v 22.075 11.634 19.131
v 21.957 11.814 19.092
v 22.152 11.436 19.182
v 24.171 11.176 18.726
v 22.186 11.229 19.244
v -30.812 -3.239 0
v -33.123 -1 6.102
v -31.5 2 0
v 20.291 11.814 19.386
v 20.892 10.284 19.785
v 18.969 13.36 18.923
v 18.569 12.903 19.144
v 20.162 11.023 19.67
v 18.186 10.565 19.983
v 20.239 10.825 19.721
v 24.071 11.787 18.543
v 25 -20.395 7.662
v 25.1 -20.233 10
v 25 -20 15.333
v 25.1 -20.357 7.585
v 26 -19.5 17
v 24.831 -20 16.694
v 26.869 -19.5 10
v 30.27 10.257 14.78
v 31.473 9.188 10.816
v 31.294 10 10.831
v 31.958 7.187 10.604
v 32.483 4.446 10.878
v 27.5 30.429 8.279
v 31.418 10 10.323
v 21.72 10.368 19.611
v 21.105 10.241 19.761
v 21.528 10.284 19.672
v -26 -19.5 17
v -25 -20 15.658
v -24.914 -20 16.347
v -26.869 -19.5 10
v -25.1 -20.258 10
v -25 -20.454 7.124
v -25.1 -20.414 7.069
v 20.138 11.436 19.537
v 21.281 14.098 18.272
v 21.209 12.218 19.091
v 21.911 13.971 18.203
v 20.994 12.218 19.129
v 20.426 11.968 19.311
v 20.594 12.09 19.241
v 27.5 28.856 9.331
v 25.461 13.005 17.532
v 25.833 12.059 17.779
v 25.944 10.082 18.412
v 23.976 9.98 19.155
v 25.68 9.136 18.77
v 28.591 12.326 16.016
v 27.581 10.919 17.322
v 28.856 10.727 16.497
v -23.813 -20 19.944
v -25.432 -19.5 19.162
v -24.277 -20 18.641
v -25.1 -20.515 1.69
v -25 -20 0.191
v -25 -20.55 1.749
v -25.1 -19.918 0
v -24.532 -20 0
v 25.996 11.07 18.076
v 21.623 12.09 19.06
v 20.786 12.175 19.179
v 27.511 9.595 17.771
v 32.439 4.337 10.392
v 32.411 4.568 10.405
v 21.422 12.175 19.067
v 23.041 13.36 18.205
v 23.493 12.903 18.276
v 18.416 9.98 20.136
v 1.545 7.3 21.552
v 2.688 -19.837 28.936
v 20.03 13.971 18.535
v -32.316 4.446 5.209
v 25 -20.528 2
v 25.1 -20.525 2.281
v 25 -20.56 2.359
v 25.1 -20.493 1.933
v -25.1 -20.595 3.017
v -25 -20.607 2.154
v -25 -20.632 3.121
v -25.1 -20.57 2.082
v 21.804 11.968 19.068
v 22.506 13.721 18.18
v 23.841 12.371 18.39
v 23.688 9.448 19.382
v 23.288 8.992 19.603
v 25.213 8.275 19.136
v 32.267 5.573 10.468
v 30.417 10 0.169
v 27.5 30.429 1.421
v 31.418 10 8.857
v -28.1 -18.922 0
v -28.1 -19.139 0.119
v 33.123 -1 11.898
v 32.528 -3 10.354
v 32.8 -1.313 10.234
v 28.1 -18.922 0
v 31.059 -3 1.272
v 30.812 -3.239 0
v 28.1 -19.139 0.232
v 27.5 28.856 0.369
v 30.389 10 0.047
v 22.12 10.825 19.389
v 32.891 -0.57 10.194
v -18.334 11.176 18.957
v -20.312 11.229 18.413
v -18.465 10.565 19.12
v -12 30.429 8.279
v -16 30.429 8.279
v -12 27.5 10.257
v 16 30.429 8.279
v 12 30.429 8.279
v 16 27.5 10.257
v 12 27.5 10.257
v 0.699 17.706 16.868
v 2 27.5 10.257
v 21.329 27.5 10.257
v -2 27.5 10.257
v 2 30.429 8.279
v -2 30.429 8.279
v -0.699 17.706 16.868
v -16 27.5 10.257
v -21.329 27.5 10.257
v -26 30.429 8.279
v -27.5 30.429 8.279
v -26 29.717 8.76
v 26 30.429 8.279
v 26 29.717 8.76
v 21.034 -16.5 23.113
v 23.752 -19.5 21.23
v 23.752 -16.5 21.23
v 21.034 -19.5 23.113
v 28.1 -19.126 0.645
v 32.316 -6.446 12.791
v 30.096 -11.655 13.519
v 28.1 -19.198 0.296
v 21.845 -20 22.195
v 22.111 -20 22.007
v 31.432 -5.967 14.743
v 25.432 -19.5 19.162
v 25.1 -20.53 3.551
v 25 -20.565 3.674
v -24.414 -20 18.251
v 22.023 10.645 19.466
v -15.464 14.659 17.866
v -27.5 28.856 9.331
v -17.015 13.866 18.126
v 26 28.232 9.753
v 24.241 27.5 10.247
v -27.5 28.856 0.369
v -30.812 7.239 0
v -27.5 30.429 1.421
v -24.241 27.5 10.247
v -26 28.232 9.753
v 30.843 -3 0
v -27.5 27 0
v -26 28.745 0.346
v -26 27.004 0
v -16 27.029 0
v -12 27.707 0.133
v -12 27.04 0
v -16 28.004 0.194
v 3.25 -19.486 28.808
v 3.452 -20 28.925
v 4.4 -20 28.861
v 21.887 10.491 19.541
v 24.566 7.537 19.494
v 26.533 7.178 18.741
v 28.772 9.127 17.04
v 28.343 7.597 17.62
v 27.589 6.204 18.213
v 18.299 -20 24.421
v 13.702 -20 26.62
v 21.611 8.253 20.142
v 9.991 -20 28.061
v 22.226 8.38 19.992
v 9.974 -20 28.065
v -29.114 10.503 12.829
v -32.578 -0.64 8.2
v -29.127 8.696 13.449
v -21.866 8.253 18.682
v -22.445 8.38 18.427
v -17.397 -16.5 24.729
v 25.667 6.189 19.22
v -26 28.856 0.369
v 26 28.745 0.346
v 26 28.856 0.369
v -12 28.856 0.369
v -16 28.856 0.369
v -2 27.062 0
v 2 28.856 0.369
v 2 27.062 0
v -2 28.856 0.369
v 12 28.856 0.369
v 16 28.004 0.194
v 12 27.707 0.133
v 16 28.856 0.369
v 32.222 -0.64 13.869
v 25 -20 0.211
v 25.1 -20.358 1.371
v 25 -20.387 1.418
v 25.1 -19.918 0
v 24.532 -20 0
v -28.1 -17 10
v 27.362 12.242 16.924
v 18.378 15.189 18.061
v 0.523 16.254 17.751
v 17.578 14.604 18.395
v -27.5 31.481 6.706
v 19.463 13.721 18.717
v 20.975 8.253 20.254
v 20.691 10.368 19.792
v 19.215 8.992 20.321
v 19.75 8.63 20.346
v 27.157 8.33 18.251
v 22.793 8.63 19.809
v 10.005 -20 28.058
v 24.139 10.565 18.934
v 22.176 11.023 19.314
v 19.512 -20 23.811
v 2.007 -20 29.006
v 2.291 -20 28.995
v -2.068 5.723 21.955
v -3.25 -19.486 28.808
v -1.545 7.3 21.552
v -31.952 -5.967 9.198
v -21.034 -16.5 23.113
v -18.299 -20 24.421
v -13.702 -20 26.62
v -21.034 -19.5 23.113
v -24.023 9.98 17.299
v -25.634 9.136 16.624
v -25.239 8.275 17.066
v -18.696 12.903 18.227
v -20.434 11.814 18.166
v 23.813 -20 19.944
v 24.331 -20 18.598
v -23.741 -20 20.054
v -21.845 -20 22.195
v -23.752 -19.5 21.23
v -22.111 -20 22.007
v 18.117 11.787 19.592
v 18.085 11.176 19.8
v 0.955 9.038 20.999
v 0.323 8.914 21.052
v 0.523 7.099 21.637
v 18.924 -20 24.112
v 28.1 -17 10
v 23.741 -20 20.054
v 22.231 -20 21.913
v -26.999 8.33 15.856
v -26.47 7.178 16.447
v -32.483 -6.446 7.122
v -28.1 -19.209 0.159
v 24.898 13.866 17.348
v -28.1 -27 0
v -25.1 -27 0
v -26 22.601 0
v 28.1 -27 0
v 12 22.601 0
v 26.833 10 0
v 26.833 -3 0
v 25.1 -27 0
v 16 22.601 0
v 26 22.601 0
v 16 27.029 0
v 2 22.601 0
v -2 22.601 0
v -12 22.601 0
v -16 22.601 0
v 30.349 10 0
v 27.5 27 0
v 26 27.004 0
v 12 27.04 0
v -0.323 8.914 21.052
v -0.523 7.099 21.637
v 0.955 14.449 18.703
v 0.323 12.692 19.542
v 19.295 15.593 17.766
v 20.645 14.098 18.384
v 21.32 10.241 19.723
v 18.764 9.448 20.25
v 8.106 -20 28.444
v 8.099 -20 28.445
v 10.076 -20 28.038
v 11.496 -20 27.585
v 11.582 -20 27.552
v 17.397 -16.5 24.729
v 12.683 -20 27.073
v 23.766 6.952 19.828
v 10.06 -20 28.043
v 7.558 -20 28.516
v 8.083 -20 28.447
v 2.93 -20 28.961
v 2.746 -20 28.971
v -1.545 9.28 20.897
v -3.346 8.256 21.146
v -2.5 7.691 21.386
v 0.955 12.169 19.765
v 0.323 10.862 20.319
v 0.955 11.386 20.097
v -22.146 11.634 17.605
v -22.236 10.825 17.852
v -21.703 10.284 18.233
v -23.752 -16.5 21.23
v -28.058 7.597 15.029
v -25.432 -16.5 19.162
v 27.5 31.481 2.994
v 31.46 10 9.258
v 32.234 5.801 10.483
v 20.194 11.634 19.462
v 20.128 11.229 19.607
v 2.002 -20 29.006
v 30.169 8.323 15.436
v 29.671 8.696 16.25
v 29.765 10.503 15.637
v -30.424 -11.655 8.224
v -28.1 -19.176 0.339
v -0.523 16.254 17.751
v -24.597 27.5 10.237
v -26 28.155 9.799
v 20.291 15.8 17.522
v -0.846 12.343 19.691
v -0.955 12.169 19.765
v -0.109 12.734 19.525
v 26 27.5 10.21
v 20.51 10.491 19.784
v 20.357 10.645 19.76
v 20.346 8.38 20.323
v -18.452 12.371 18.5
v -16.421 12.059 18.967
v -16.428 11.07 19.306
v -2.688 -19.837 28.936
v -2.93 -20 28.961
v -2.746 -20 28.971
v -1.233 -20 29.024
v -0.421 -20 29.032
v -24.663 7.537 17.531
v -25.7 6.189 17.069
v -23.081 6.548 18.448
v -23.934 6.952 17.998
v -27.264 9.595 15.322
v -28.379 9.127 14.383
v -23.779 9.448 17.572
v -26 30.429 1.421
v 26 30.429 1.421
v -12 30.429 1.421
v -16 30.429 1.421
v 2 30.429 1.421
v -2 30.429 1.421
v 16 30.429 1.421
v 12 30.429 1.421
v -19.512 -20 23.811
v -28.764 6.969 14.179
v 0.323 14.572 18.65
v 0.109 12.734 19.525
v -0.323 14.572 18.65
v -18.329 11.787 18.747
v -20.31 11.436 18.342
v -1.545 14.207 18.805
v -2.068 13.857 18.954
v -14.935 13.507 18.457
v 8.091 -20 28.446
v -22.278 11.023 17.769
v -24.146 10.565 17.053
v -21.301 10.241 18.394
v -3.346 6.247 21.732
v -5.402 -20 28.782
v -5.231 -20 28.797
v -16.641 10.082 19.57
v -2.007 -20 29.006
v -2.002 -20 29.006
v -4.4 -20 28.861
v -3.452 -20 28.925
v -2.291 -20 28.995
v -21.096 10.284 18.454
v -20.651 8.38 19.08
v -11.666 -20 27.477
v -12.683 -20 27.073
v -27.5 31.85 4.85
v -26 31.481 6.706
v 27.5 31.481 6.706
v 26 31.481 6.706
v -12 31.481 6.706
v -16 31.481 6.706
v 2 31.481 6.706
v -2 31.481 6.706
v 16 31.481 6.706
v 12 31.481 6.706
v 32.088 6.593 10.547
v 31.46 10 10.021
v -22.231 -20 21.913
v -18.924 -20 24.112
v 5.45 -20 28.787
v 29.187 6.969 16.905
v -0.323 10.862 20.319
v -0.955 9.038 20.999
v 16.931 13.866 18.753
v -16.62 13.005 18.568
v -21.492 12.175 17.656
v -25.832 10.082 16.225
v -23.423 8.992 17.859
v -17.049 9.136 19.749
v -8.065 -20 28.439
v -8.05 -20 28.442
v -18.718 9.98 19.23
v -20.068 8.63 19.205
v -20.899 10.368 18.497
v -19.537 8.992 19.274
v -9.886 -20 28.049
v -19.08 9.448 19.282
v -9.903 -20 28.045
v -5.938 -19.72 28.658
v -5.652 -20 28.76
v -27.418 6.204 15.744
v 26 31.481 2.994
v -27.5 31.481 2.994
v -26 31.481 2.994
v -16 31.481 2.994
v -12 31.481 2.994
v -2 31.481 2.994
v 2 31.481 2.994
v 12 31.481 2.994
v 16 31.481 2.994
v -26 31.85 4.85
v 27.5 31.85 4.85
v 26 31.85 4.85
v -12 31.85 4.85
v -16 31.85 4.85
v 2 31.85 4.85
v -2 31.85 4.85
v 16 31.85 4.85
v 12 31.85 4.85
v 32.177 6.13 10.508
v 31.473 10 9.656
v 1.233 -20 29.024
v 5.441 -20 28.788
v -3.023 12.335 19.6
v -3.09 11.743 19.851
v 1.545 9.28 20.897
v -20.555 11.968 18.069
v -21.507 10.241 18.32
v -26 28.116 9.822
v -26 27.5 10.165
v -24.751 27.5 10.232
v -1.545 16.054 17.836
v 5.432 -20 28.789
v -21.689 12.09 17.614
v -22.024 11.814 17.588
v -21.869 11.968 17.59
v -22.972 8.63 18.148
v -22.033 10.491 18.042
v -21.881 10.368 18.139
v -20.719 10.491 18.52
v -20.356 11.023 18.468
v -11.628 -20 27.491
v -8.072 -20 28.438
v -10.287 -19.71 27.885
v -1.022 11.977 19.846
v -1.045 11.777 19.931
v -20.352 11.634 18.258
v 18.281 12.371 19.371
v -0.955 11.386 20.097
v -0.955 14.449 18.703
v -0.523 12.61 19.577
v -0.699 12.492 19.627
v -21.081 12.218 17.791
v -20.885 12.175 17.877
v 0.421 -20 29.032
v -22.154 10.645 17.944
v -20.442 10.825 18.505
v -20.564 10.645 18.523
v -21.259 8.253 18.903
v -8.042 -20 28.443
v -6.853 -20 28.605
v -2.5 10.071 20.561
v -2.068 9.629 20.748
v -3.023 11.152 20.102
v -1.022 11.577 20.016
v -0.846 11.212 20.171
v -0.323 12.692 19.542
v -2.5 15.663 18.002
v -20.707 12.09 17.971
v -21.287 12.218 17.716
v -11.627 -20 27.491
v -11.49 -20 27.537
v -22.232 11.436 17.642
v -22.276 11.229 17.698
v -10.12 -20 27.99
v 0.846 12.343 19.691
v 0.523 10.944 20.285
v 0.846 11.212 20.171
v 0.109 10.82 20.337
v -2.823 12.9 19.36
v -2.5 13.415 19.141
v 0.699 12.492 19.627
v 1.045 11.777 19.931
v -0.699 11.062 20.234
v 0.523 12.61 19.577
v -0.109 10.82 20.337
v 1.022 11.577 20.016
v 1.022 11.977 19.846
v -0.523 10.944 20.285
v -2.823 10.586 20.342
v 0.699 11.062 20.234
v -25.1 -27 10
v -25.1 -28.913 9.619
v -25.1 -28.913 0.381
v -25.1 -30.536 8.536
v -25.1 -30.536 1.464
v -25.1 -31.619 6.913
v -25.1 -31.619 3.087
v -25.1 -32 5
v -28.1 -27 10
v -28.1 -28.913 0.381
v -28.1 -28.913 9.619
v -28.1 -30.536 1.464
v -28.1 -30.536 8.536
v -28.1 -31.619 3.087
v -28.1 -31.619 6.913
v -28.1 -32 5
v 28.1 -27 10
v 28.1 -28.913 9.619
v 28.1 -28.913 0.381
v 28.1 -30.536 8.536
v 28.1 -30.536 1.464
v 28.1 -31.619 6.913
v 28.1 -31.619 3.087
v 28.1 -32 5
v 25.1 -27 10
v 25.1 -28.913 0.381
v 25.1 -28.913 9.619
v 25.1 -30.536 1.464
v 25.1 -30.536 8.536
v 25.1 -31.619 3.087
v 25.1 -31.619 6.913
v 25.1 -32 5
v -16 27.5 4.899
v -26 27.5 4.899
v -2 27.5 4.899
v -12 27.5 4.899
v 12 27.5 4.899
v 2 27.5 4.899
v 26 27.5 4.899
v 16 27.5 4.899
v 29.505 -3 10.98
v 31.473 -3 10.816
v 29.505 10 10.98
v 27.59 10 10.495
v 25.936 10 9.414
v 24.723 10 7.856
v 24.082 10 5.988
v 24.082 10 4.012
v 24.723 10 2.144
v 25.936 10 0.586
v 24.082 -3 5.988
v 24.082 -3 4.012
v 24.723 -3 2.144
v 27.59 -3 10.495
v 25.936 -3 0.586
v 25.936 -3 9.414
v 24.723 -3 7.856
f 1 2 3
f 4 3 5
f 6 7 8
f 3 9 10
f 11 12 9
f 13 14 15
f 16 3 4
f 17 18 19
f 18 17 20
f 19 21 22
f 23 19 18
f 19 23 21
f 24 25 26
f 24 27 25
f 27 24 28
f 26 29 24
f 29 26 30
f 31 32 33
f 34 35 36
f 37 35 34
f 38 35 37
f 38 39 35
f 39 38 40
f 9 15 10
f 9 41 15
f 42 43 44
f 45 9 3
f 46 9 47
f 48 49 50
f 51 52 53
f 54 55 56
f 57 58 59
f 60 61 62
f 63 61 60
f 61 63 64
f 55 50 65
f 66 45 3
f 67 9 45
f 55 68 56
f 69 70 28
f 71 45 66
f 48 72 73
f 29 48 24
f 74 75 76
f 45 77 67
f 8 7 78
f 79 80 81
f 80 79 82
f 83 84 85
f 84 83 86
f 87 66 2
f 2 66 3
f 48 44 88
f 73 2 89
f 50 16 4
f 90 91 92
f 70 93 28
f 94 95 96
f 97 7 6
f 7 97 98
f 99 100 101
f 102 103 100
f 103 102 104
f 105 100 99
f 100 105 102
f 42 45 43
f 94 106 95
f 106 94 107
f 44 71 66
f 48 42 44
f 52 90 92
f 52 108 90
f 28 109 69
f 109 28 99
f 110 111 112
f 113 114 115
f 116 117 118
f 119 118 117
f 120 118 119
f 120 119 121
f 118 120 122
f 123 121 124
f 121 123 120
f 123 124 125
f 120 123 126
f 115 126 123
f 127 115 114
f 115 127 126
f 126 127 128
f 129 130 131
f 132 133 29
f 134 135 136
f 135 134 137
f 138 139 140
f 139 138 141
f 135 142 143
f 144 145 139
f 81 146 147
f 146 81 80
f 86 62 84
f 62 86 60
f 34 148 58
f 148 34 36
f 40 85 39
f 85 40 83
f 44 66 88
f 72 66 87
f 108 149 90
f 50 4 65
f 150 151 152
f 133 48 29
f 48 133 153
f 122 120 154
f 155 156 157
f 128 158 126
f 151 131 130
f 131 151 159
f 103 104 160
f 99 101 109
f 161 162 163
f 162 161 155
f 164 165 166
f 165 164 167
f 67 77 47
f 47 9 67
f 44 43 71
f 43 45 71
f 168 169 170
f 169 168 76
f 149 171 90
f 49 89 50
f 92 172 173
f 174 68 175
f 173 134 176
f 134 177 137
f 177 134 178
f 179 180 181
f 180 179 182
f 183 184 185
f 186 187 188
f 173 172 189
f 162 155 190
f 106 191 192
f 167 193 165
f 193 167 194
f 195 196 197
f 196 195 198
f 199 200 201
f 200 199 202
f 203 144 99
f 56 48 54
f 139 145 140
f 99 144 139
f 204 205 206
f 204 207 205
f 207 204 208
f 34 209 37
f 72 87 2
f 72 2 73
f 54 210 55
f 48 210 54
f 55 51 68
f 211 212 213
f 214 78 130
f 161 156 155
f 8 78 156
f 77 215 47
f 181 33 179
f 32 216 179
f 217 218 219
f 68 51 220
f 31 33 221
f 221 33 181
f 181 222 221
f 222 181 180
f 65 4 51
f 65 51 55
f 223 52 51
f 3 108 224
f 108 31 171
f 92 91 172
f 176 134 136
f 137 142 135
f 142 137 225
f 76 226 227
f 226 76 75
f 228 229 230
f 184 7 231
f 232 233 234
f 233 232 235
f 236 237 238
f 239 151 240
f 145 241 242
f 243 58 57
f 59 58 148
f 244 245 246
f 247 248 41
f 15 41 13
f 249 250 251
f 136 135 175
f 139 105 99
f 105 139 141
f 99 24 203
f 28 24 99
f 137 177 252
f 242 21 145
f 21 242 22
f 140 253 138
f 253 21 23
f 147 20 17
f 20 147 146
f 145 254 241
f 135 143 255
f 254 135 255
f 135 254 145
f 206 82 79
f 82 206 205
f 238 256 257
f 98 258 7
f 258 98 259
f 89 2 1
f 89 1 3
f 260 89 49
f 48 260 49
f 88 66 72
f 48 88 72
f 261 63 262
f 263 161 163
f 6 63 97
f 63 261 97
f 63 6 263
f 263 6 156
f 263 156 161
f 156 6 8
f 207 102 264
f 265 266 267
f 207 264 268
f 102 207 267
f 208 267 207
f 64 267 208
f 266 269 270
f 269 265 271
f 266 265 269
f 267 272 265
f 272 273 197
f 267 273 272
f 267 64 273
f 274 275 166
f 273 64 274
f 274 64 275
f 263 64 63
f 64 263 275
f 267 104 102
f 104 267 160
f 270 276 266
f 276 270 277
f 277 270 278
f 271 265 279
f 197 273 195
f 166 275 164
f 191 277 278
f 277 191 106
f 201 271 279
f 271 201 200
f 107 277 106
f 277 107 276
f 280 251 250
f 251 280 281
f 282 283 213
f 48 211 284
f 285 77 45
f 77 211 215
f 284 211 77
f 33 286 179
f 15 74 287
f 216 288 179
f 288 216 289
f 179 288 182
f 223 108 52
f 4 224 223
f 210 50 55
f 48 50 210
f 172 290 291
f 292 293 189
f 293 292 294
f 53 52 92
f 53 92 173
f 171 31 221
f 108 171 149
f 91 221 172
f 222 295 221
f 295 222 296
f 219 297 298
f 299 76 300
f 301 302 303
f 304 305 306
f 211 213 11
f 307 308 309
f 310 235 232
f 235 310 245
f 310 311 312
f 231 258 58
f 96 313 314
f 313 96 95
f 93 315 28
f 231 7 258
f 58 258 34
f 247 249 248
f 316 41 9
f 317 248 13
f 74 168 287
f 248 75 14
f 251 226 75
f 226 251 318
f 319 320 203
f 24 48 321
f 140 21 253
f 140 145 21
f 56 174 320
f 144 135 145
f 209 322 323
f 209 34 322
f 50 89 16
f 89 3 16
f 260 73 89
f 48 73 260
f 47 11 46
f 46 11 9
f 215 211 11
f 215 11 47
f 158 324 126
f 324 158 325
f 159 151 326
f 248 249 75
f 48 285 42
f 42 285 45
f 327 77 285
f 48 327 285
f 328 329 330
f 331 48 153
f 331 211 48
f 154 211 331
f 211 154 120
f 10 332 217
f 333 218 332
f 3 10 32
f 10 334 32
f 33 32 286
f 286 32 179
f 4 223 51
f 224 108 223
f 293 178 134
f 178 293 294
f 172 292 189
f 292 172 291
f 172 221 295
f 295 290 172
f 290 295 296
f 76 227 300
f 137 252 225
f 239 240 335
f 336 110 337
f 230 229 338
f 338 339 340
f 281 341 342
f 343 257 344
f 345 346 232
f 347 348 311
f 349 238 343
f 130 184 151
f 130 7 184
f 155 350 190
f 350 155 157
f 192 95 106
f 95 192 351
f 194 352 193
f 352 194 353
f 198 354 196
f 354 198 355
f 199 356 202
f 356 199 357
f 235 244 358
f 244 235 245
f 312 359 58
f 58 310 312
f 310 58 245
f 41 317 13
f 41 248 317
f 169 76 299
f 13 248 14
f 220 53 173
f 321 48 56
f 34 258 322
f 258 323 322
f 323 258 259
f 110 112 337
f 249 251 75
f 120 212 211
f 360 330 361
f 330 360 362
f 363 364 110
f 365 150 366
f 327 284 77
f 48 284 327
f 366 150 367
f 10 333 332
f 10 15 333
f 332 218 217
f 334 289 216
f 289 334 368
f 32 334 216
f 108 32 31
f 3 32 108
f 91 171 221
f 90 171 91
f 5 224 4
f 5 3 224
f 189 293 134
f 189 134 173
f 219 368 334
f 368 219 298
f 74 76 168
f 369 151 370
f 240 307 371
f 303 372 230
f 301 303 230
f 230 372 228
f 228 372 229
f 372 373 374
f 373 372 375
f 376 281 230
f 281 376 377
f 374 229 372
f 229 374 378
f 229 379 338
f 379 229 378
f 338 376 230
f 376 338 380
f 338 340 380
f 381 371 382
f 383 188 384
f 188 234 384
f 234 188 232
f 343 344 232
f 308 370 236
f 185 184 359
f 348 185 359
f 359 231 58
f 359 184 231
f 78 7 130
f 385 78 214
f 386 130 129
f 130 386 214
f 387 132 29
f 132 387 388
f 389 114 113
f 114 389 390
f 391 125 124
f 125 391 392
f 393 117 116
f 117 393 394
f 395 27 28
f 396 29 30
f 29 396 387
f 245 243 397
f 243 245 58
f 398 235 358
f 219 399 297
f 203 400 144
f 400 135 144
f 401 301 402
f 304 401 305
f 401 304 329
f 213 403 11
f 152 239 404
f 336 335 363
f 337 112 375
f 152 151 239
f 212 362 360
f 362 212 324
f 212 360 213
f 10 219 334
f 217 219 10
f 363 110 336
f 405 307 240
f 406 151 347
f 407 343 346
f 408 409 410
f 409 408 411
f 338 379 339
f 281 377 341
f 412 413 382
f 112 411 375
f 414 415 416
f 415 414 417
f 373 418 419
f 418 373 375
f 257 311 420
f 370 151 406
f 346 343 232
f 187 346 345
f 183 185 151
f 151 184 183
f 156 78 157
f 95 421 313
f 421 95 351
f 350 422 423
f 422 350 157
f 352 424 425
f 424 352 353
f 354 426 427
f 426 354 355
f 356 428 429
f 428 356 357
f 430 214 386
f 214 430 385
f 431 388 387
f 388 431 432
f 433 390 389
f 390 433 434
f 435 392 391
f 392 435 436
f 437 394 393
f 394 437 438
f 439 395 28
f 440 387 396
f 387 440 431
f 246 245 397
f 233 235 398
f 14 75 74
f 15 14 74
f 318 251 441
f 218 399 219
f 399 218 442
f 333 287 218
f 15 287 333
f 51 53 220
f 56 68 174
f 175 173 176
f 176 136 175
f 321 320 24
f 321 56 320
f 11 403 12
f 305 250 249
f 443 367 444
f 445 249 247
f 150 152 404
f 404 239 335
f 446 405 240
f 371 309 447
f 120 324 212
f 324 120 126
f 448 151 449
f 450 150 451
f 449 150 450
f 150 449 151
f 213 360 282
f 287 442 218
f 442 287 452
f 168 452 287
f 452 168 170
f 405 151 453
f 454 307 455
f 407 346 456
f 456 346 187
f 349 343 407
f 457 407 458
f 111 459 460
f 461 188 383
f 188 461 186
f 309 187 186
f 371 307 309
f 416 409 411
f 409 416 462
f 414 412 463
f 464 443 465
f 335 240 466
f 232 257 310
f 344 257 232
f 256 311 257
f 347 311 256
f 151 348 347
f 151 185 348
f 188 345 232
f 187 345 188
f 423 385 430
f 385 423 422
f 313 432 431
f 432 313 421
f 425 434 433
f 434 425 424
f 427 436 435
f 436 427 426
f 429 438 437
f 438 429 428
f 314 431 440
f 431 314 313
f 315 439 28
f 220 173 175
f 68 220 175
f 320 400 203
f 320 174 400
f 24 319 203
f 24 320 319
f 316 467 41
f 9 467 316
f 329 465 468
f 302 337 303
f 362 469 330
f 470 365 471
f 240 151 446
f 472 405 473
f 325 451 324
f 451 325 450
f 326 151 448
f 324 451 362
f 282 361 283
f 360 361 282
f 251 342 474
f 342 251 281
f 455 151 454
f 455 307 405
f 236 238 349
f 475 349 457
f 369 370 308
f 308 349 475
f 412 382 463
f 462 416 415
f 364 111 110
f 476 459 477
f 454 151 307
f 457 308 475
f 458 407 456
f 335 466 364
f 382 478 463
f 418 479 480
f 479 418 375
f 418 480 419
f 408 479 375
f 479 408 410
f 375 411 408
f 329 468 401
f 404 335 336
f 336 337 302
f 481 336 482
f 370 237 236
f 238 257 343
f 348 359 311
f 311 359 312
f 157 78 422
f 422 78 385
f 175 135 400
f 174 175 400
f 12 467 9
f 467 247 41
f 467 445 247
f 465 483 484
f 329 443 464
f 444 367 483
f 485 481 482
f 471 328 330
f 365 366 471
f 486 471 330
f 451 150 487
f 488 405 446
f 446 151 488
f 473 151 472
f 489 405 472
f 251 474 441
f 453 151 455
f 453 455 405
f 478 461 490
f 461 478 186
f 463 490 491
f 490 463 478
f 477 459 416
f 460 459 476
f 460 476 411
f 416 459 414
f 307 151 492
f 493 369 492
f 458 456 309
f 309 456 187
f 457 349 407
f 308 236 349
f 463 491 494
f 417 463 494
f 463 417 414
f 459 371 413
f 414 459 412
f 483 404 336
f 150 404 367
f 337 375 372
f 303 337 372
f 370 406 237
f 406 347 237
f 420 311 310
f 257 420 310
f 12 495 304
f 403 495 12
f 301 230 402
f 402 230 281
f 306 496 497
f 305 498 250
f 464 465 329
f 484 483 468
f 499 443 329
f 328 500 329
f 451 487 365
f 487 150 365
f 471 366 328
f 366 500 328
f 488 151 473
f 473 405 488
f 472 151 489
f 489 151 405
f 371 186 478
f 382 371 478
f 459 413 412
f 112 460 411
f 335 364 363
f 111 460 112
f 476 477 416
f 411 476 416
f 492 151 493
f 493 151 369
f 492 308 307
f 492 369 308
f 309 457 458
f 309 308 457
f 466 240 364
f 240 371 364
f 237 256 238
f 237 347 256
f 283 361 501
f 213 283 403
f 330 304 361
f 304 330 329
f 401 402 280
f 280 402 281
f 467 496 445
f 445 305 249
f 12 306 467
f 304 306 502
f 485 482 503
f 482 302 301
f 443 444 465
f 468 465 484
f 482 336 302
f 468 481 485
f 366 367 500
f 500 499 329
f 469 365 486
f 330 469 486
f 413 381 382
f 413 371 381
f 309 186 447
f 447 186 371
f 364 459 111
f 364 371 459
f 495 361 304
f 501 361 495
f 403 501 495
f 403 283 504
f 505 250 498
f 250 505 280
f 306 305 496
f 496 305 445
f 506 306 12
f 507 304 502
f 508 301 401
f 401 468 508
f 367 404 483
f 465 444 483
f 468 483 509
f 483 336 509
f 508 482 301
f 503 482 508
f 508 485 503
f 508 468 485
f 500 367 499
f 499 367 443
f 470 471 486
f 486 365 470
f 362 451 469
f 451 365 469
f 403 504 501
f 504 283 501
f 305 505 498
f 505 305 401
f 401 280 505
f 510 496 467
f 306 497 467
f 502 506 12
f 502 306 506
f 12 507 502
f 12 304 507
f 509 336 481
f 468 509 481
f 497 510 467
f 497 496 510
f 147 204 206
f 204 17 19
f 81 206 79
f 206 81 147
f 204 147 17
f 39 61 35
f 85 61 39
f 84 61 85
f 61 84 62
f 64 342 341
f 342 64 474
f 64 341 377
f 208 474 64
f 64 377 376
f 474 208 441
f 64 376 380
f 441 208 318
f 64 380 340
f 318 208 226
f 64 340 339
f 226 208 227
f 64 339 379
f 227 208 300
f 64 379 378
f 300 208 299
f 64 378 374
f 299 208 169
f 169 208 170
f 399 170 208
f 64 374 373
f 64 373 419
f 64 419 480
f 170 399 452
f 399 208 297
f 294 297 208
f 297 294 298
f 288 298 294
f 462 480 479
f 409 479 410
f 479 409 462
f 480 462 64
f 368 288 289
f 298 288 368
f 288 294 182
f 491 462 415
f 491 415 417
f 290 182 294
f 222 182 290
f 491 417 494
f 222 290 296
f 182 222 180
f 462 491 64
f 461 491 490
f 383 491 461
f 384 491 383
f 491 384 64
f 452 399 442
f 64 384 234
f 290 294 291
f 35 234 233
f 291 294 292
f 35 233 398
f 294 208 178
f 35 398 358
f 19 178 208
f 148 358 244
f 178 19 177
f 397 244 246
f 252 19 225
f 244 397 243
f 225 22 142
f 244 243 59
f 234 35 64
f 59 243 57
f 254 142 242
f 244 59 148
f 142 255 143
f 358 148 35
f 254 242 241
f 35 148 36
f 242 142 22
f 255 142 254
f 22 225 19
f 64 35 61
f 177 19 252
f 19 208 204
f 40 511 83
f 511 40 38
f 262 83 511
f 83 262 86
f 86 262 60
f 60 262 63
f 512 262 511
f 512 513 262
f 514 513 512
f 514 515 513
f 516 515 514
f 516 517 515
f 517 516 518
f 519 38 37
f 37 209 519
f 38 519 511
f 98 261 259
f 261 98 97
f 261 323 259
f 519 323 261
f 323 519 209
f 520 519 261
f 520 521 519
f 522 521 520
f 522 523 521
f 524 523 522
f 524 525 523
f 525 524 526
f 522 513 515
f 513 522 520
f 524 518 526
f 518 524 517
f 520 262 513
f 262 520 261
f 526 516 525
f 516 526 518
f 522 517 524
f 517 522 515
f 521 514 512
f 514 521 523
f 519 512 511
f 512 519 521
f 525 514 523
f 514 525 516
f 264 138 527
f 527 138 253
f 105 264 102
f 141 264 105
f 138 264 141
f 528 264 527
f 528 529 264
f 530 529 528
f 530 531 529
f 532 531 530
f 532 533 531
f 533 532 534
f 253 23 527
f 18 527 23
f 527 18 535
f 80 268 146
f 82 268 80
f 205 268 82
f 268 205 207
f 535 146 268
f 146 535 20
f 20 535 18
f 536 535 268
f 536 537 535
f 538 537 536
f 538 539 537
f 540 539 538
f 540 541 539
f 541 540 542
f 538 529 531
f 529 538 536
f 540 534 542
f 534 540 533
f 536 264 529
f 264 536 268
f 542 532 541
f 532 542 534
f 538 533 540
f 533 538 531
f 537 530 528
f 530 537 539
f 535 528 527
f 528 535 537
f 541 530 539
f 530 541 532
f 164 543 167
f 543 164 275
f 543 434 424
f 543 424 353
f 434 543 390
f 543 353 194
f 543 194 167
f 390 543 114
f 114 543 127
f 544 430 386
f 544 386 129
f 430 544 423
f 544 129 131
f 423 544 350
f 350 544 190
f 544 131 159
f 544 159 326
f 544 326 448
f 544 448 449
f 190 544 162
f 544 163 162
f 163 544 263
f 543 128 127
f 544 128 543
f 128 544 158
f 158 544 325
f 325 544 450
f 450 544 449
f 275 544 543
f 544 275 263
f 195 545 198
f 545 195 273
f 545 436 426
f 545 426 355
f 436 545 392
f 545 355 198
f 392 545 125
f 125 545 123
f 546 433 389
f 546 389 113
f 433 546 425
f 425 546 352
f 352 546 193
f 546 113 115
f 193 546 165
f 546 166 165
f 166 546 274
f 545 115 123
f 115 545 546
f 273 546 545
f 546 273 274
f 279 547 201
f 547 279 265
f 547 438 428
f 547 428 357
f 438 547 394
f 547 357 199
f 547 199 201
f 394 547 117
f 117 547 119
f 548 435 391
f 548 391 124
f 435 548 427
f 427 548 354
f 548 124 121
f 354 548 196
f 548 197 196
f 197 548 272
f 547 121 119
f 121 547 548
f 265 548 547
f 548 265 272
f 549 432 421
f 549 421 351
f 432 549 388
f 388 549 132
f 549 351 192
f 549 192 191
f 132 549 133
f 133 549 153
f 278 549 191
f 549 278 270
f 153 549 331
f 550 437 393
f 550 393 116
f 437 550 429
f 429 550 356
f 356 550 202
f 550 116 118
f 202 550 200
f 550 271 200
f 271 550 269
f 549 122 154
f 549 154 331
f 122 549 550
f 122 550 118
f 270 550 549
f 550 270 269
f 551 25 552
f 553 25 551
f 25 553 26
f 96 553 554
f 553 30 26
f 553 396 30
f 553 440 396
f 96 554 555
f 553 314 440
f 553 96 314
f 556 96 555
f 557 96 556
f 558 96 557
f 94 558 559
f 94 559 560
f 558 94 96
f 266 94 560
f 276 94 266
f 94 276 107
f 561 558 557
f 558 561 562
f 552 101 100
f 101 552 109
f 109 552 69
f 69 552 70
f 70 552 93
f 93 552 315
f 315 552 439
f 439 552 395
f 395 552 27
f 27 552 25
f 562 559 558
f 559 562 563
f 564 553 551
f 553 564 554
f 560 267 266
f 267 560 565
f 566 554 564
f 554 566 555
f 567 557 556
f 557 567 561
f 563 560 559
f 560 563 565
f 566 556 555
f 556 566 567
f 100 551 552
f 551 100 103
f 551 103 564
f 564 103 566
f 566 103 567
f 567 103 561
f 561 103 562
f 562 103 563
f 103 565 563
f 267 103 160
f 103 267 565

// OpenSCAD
module palm()
{
	difference()
		{
            difference()
			{
			palmbody();
			for(i=[-3,-1,1,3]) translate([i*7,28,0]) 
				{
				translate([0,4.5,0]) {
					cube([10,10,21.6], center=true);
					rotate([-45,0,0]) cube([10,14,21.6], center=true);
				}	
			}
			translate([0,0,-100/2]) cube(100, center=true);
			}
        translate([30,10,5]) rotate([90,0,0]) cylinder(h=13, r=6);
		}
}

module palmbody()
{
    difference(){
        //	Palm
        hull() {
            translate([20.5,10,15.7]) rotate([-18,10,0]) scale([1,1,0.4]) sphere(10);
                
            translate([0,11,18.1]) rotate([-23,0,0]) scale([1,1,0.2]) sphere(10);

            translate([-20,10,14.5]) rotate([-18,-20,0]) scale([1,1,0.4]) sphere(10);
        
            translate([0,27,4.85]) rotate([0,90,0]) 
                cylinder(r=4.85, h=55, center=true);

            translate([0,2,0]) scale([1,0.8,1]) cylinder(r=64/2-0.5, h=10/2);	
            difference()
                {
                translate([0,-1,10-1]) rotate([-10,-5,0]) scale([1,0.8,0.3]) 
                    sphere(r=64/2+1.25);
                translate([0,0,-1000/2]) cube(1000, center=true);
                }

            for(i=[-1,1]) translate([26.6*i,-12,10/2]) cube([3,10,10], center=true); 

            translate([0,-18,0]) 
                {
                translate([0,0,17]) scale([1,1,0.4]) rotate([90,0,0]) 
                    cylinder(r=64/2-6, h=3, center=true); 
                rotate([90,0,0]) intersection() 
                    { 
                    cylinder(r=64/2-4, h=3, center=true); 
                    translate([0,64,0]) cube(64*2, center=true); 
                    }
                }

            translate([0,-19,26]) intersection() 
                { 
                rotate([-20,0,0]) scale([0.5,0.3,0.1]) sphere(r=64/2-6); 
                }
        }
        translate([-25,-30,0]) cube([50,10,30]);
    }
        
    //wrist joint
	for(i=[-1,1]) 
		translate([26.6*i,-12,10/2]) { 
			cube([3,30,10], center=true); 
			translate([0,-30+10*1.5,0]) rotate([0,90,0]) 
				cylinder(r=5, h=3, center=true);
		}
}
    
palm();
